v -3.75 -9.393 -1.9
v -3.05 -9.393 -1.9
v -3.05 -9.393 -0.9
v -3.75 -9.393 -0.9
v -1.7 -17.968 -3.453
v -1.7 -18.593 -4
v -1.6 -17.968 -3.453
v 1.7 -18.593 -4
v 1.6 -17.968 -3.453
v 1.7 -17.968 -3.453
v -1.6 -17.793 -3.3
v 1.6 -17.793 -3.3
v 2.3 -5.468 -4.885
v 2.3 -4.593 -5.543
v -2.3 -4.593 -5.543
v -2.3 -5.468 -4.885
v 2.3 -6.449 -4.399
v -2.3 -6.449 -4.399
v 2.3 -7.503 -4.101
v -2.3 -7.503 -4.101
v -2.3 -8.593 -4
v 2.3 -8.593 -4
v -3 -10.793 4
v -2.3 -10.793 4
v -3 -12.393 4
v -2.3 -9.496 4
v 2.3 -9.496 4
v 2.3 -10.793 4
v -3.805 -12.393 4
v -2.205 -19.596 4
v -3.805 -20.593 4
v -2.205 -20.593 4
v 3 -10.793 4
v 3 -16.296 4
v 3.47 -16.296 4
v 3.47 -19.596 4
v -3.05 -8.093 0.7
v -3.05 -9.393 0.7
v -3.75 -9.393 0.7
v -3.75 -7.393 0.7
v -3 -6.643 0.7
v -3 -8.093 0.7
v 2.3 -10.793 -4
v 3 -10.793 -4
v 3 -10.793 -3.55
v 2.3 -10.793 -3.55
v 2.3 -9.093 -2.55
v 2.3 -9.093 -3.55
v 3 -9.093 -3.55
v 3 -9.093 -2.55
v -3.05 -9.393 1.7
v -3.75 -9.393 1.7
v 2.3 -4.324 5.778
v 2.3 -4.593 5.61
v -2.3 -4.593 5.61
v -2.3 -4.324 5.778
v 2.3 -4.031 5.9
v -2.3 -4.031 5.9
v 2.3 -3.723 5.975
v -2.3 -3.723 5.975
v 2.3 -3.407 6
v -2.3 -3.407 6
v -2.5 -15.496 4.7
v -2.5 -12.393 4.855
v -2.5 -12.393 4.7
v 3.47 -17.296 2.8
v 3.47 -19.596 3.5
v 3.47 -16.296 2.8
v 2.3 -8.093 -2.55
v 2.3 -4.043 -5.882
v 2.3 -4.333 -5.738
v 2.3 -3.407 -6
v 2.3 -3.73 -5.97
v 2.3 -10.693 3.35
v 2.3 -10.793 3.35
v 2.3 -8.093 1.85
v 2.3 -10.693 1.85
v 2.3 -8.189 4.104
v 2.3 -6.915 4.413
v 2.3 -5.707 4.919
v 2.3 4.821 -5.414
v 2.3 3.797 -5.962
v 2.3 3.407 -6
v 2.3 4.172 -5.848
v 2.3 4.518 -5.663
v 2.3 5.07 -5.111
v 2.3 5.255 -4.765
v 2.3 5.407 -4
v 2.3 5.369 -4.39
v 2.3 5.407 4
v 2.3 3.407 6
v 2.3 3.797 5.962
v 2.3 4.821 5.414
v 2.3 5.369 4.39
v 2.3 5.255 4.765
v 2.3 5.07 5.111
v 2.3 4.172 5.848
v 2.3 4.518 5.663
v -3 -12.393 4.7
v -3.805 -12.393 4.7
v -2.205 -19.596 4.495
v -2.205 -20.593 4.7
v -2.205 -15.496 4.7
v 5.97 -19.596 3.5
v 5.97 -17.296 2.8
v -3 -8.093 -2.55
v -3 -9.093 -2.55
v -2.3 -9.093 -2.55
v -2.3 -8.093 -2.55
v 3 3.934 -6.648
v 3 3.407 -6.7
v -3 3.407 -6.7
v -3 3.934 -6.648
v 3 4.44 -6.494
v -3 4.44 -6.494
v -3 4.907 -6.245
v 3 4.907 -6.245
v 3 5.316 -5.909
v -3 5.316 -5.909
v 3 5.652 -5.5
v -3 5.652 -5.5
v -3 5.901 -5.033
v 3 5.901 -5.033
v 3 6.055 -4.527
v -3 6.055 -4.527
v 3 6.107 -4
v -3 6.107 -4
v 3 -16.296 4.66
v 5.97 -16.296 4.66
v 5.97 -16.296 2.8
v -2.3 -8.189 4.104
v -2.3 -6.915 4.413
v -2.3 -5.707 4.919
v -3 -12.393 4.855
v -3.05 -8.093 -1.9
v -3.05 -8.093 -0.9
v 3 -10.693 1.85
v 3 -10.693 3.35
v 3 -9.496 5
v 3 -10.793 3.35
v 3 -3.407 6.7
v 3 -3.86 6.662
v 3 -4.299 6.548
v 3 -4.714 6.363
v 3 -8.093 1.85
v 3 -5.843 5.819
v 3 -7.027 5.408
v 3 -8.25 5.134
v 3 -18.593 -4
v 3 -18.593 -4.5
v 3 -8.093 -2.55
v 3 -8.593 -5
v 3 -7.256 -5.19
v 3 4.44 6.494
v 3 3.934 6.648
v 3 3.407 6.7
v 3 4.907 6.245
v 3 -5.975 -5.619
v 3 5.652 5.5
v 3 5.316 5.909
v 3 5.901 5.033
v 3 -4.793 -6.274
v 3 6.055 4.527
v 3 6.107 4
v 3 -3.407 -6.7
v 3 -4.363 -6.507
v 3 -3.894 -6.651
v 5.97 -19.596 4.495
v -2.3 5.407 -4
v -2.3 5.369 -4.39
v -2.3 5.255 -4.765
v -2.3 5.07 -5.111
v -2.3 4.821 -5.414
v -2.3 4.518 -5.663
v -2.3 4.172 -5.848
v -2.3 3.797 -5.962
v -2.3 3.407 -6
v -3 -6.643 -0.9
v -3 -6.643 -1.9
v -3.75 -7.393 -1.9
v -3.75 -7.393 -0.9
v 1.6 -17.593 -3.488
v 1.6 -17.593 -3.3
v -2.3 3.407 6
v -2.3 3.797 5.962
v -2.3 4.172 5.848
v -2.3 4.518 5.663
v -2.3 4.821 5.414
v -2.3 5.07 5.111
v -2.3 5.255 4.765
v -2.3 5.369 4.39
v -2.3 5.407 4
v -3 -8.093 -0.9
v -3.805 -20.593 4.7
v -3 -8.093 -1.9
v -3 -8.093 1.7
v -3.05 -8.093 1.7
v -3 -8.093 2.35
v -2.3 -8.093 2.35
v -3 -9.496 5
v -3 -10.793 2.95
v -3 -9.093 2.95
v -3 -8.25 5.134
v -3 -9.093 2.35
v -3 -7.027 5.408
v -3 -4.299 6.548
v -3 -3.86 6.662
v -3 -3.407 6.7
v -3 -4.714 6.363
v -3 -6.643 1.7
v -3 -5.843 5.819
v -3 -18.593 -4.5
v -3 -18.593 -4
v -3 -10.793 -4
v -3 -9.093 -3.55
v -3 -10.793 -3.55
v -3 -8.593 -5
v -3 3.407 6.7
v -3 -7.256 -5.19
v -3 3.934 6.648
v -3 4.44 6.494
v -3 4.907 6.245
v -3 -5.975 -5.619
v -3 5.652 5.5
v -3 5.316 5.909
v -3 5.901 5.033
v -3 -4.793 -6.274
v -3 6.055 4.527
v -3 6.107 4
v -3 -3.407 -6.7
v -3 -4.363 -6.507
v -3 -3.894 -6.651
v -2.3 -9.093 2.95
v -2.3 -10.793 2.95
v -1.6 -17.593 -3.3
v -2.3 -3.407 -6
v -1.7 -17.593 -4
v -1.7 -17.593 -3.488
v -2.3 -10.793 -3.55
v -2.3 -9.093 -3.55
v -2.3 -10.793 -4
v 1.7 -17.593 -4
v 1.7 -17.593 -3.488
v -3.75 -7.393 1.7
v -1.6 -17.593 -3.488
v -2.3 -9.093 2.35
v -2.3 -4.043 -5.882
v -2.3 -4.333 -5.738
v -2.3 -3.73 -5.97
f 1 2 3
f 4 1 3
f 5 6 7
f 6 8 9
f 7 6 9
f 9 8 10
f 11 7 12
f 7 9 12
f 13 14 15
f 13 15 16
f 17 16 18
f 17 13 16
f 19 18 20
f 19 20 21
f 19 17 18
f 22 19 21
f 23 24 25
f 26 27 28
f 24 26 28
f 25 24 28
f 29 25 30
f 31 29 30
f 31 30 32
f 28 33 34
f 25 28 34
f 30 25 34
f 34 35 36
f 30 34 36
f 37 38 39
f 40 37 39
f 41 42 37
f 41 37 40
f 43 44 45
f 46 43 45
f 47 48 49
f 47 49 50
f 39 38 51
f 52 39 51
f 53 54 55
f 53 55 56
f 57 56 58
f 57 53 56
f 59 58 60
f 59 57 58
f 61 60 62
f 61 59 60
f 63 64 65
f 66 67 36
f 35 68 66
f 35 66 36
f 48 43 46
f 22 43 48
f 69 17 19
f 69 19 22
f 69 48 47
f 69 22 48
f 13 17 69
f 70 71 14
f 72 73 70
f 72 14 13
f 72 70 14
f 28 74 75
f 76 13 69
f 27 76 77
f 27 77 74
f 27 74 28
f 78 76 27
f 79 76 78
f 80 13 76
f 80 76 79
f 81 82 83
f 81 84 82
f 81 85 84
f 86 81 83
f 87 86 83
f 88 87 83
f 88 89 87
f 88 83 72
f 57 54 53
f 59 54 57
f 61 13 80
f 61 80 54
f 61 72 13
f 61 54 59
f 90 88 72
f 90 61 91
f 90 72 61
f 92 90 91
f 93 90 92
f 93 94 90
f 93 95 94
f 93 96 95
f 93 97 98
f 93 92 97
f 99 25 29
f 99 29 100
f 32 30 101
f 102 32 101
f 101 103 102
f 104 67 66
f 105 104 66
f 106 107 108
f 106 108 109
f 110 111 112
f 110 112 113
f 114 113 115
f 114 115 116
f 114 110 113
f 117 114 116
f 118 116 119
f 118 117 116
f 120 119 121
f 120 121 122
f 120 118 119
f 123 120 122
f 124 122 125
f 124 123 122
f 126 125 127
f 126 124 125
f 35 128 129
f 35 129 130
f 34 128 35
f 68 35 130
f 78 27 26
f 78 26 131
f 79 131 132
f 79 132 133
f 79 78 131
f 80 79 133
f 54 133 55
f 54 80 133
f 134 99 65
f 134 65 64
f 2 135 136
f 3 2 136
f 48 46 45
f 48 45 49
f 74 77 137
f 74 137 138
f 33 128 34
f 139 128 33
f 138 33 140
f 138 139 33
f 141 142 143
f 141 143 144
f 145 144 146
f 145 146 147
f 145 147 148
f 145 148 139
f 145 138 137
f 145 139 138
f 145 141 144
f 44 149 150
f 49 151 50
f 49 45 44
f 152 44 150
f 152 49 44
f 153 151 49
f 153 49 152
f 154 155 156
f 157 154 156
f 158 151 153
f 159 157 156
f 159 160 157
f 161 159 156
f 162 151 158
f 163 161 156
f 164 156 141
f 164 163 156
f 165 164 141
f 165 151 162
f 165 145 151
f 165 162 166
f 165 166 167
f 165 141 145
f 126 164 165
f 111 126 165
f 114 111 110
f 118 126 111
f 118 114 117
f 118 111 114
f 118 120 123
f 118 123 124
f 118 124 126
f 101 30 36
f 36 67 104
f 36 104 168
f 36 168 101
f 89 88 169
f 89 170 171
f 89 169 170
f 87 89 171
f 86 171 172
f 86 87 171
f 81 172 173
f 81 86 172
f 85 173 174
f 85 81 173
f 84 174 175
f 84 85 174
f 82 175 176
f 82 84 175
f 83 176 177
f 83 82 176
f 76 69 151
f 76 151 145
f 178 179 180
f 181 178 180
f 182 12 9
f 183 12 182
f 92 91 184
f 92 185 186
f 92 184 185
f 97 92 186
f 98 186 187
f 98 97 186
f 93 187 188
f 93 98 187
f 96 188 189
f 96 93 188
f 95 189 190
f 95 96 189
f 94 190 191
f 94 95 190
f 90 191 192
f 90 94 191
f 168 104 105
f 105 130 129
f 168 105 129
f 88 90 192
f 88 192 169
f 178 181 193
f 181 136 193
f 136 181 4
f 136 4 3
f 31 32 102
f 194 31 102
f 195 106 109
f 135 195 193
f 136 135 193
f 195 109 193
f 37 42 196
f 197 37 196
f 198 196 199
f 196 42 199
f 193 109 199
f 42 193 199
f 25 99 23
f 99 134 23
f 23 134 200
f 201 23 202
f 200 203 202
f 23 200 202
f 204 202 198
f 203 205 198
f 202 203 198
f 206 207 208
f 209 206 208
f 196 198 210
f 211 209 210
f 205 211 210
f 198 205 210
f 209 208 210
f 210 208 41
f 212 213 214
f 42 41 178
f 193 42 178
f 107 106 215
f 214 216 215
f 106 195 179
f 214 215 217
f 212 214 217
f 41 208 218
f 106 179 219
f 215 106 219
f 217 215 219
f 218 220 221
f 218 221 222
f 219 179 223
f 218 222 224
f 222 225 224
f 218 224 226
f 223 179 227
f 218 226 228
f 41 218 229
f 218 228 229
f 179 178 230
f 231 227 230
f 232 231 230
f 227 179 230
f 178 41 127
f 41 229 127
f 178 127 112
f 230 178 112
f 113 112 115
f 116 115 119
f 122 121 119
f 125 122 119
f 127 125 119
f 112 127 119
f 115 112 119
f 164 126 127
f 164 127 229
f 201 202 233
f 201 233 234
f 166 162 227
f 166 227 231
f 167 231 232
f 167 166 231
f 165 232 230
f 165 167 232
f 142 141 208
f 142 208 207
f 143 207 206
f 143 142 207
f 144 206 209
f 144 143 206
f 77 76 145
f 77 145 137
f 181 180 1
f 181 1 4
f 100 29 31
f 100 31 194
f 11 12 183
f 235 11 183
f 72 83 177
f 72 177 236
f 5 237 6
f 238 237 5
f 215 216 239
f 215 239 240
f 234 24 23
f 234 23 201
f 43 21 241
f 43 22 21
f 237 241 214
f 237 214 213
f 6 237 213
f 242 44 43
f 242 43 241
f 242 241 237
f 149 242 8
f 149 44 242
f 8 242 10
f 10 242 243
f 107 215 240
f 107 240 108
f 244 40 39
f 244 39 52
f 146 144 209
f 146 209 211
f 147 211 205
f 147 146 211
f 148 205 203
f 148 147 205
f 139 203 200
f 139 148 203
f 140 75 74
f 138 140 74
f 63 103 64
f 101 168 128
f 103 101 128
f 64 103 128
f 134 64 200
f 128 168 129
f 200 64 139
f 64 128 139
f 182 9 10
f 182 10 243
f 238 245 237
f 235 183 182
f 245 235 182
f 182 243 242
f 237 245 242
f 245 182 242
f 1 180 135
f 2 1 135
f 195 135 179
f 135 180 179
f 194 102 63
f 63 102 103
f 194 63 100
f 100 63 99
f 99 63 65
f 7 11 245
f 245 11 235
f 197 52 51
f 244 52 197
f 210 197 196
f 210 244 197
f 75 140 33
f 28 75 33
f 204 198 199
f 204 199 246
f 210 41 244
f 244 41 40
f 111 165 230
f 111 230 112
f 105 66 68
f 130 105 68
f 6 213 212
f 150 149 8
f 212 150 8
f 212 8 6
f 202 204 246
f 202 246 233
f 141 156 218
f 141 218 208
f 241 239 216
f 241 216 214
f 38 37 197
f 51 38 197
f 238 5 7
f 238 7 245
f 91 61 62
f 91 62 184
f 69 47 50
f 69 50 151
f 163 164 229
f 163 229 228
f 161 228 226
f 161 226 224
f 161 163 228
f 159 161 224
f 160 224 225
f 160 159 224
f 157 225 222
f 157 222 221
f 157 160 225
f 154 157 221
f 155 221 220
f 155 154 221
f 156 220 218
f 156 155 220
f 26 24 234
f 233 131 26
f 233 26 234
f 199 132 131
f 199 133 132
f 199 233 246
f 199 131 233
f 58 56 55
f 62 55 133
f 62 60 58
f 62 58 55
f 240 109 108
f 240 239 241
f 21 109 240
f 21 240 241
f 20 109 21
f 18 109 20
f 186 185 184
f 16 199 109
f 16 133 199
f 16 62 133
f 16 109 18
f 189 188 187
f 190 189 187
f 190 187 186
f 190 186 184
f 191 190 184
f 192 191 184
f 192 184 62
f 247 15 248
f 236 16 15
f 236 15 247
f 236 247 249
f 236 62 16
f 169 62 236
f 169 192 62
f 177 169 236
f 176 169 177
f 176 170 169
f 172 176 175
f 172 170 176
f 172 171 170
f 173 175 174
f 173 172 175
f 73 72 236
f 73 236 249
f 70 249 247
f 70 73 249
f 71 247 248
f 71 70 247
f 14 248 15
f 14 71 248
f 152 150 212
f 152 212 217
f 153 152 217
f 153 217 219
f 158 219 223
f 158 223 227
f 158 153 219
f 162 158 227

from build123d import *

# Parameters (mm, degrees)
BOSS_EXTRUDE1_DEPTH      = 3
BOSS_EXTRUDE2_DEPTH      = 0.7
BOSS_EXTRUDE3_START      = -5.3
BOSS_EXTRUDE3_DEPTH      = 0.7
BOSS_EXTRUDE4_DEPTH      = 1.7
BOSS_EXTRUDE5_DEPTH      = 2.97
BOSS_EXTRUDE6_DEPTH      = 2.5
BOSS_EXTRUDE7_DEPTH      = 0.805
BOSS_EXTRUDE7_DEPTH_BACK = 0.795
SKETCH7_W                = 0.7
SKETCH7_H                = 8.2
CUT_EXTRUDE2_DEPTH       = 0.5
CUT_EXTRUDE3_DEPTH       = 23.844830336
BOSS_EXTRUDE8_DEPTH      = 5.205
INDENT1_START            = -3
INDENT1_DEPTH            = 6
INDENT1_2_DEPTH          = 1.4
INDENT1_START_2          = 1.6
INDENT1_3_OUTLINE_W      = 0.1
INDENT1_3_OUTLINE_H      = 0.4
INDENT1_3_DEPTH          = 1.4
BOSS_EXTRUDE11_START     = 0.05
SKETCH14_W               = 1
SKETCH14_H               = 2
BOSS_EXTRUDE11_DEPTH     = 0.7
BOSS_EXTRUDE11_2_DEPTH   = 0.7
SKETCH15_W               = 1
SKETCH15_H               = 0.7
BOSS_EXTRUDE12_DEPTH     = 0.05
BOSS_EXTRUDE13_REACH     = 25.101
CUT_EXTRUDE4_REACH       = 18.211
SKETCH17_W               = 0.75
SKETCH17_H               = 1.6


# Read off the part's stored shape, not the designer's step: Indent1
with BuildPart() as part:
    # Sketch1 → Boss-Extrude1 (new, symmetric)
    with BuildSketch(Plane(origin=(0, 0, 0), x_dir=(0, 0, -1), z_dir=(1, 0, 0))):
        with BuildLine():
            Line((-4, 5.407024303), (4, 5.407024303))
            ThreePointArc((4, 5.407024303), (5.414213562, 4.821237865), (6, 3.407024303))
            Line((6, 3.407024303), (6, -3.407024303))
            ThreePointArc((6, -3.407024303), (5.881695242, -4.042569102), (5.54262919, -4.592975697))
            ThreePointArc((5.54262919, -4.592975697), (4.399020595, -6.449397799), (4, -8.592975697))
            Line((4, -8.592975697), (4, -18.592975697))
            Line((4, -18.592975697), (4.5, -18.592975697))
            Line((4.5, -18.592975697), (5, -8.592975697))
            ThreePointArc((5, -8.592975697), (5.375406184, -6.605461118), (6.273600288, -4.793172135))
            ThreePointArc((6.273600288, -4.793172135), (6.590990962, -4.132148866), (6.7, -3.407024303))
            Line((6.7, -3.407024303), (6.7, 3.407024303))
            ThreePointArc((6.7, 3.407024303), (5.909188309, 5.316212612), (4, 6.107024303))
            Line((4, 6.107024303), (-4, 6.107024303))
            ThreePointArc((-4, 6.107024303), (-5.909188309, 5.316212612), (-6.7, 3.407024303))
            Line((-6.7, 3.407024303), (-6.7, -3.407024303))
            ThreePointArc((-6.7, -3.407024303), (-6.614300123, -4.08188345), (-6.362640838, -4.7139016))
            ThreePointArc((-6.362640838, -4.7139016), (-5.407997914, -7.026917179), (-5, -9.495706737))
            Line((-5, -9.495706737), (-4.5, -19.495706737))
            Line((-4.5, -19.495706737), (-4, -19.495706737))
            Line((-4, -19.495706737), (-4, -9.495706737))
            ThreePointArc((-4, -9.495706737), (-4.412921237, -6.915479473), (-5.610440713, -4.592975697))
            ThreePointArc((-5.610440713, -4.592975697), (-5.900115974, -4.03117115), (-6, -3.407024303))
            Line((-6, -3.407024303), (-6, 3.407024303))
            ThreePointArc((-6, 3.407024303), (-5.414213562, 4.821237865), (-4, 5.407024303))
        make_face()
    extrude(amount=BOSS_EXTRUDE1_DEPTH, both=True)

    # Sketch2 → Boss-Extrude2 (add)
    with BuildSketch(Plane(origin=(3, 0, 0), x_dir=(0, 0, -1), z_dir=(1, 0, 0))):
        with BuildLine():
            Line((5, -8.592975697), (4.89, -10.792975697))
            Line((4.89, -10.792975697), (-4.935136552, -10.792975697))
            Line((-4.935136552, -10.792975697), (-5, -9.495706737))
            ThreePointArc((-5, -9.495706737), (-5.407997914, -7.026917179), (-6.362640838, -4.7139016))
            ThreePointArc((-6.362640838, -4.7139016), (-6.614300123, -4.08188345), (-6.7, -3.407024303))
            Line((-6.7, -3.407024303), (-6.7, 3.407024303))
            ThreePointArc((-6.7, 3.407024303), (-5.909188309, 5.316212612), (-4, 6.107024303))
            Line((-4, 6.107024303), (4, 6.107024303))
            ThreePointArc((4, 6.107024303), (5.909188309, 5.316212612), (6.7, 3.407024303))
            Line((6.7, 3.407024303), (6.7, -3.407024303))
            ThreePointArc((6.7, -3.407024303), (6.590990962, -4.132148866), (6.273600288, -4.793172135))
            ThreePointArc((6.273600288, -4.793172135), (5.375406184, -6.605461118), (5, -8.592975697))
        make_face()
    extrude(amount=-BOSS_EXTRUDE2_DEPTH)

    # Sketch2<2> → Boss-Extrude3 (add)
    with BuildSketch(Plane(origin=(3, 0, 0), x_dir=(0, 0, -1), z_dir=(1, 0, 0)).offset(BOSS_EXTRUDE3_START)):
        with BuildLine():
            Line((4.89, -10.792975697), (5, -8.592975697))
            ThreePointArc((5, -8.592975697), (5.375406184, -6.605461118), (6.273600288, -4.793172135))
            ThreePointArc((6.273600288, -4.793172135), (6.590990962, -4.132148866), (6.7, -3.407024303))
            Line((6.7, -3.407024303), (6.7, 3.407024303))
            ThreePointArc((6.7, 3.407024303), (5.909188309, 5.316212612), (4, 6.107024303))
            Line((4, 6.107024303), (-4, 6.107024303))
            ThreePointArc((-4, 6.107024303), (-5.909188309, 5.316212612), (-6.7, 3.407024303))
            Line((-6.7, 3.407024303), (-6.7, -3.407024303))
            ThreePointArc((-6.7, -3.407024303), (-6.614300123, -4.08188345), (-6.362640838, -4.7139016))
            ThreePointArc((-6.362640838, -4.7139016), (-5.407997914, -7.026917179), (-5, -9.495706737))
            Line((-5, -9.495706737), (-4.935136552, -10.792975697))
            Line((-4.935136552, -10.792975697), (-4, -10.792975697))
            Line((-4, -10.792975697), (-4, -9.495706737))
            ThreePointArc((-4, -9.495706737), (-4.412921237, -6.915479473), (-5.610440713, -4.592975697))
            ThreePointArc((-5.610440713, -4.592975697), (-5.900115974, -4.03117115), (-6, -3.407024303))
            Line((-6, -3.407024303), (-6, 3.407024303))
            ThreePointArc((-6, 3.407024303), (-5.414213562, 4.821237865), (-4, 5.407024303))
            Line((-4, 5.407024303), (4, 5.407024303))
            ThreePointArc((4, 5.407024303), (5.414213562, 4.821237865), (6, 3.407024303))
            Line((6, 3.407024303), (6, -3.407024303))
            ThreePointArc((6, -3.407024303), (5.881695242, -4.042569102), (5.54262919, -4.592975697))
            ThreePointArc((5.54262919, -4.592975697), (4.399020595, -6.449397799), (4, -8.592975697))
            Line((4, -8.592975697), (4, -10.792975697))
            Line((4, -10.792975697), (4.89, -10.792975697))
        make_face()
        Polygon((4.5, -18.592975697), (4.89, -10.792975697), (4, -10.792975697), (4, -18.592975697), align=None)
        with BuildLine():
            Line((-4, -10.792975697), (4, -10.792975697))
            Line((4, -10.792975697), (4, -8.592975697))
            ThreePointArc((4, -8.592975697), (4.399020595, -6.449397799), (5.54262919, -4.592975697))
            ThreePointArc((5.54262919, -4.592975697), (5.881695242, -4.042569102), (6, -3.407024303))
            Line((6, -3.407024303), (6, 3.407024303))
            ThreePointArc((6, 3.407024303), (5.414213562, 4.821237865), (4, 5.407024303))
            Line((4, 5.407024303), (-4, 5.407024303))
            ThreePointArc((-4, 5.407024303), (-5.414213562, 4.821237865), (-6, 3.407024303))
            Line((-6, 3.407024303), (-6, -3.407024303))
            ThreePointArc((-6, -3.407024303), (-5.900115974, -4.03117115), (-5.610440713, -4.592975697))
            ThreePointArc((-5.610440713, -4.592975697), (-4.412921237, -6.915479473), (-4, -9.495706737))
            Line((-4, -9.495706737), (-4, -10.792975697))
        make_face()
        Polygon((-4, -19.495706737), (-4, -10.792975697), (-4.935136552, -10.792975697), (-4.5, -19.495706737), align=None)
    extrude(amount=-BOSS_EXTRUDE3_DEPTH)

    # Sketch4 → Boss-Extrude4 (add, symmetric)
    with BuildSketch(Plane(origin=(0, 0, 0), x_dir=(0, 0, -1), z_dir=(1, 0, 0))):
        Polygon((3.3, -17.592975697), (4, -17.592975697), (4, -18.592975697), (3.3, -17.792975697), align=None)
    extrude(amount=BOSS_EXTRUDE4_DEPTH, both=True)

    # Sketch5 → Boss-Extrude5 (add)
    with BuildSketch(Plane(origin=(3, 0, 0), x_dir=(0, 0, -1), z_dir=(1, 0, 0))):
        Polygon((-4.495, -19.595706737), (-4.66, -16.295706737), (-4, -16.295706737), (-4, -19.595706737), align=None)
    extrude(amount=BOSS_EXTRUDE5_DEPTH)

    # Sketch6 → Boss-Extrude6 (add)
    with BuildSketch(Plane(origin=(5.97, 0, 0), x_dir=(0, 0, -1), z_dir=(1, 0, 0))):
        Polygon((-4.66, -16.295706737), (-1.51, -16.295706737), (-1.51, -17.795706737), (-3.5, -19.595706737), (-4.495, -19.595706737), align=None)
    extrude(amount=-BOSS_EXTRUDE6_DEPTH)

    # Sketch7 → Boss-Extrude7 (add, two sides: drawn at the far end of the back side and taken through both)
    with BuildSketch(Plane.ZY.offset(3).offset(-BOSS_EXTRUDE7_DEPTH_BACK)):
        with Locations((4.35, -16.492975697)):
            Rectangle(SKETCH7_W, SKETCH7_H)
    extrude(amount=BOSS_EXTRUDE7_DEPTH + BOSS_EXTRUDE7_DEPTH_BACK)

    # Sketch8 → Cut-Extrude2 (cut)
    with BuildSketch(Plane.ZY.offset(3)):
        Polygon((4.7, -15.495706737), (4.7, -12.392975697), (4.855136552, -12.392975697), align=None)
    extrude(amount=-CUT_EXTRUDE2_DEPTH, mode=Mode.SUBTRACT)

    # Sketch9 → Cut-Extrude3 (cut, through all)
    with BuildSketch(Plane.ZY.offset(-3.47)):
        Polygon((2.8, -16.295706737), (1.51, -16.295706737), (1.51, -17.795706737), (3.5, -19.595706737), (2.8, -17.295706737), align=None)
    extrude(amount=-CUT_EXTRUDE3_DEPTH, mode=Mode.SUBTRACT)

    # Sketch10 → Boss-Extrude8 (add)
    with BuildSketch(Plane.ZY.offset(-3)):
        Polygon((4.495, -19.595706737), (4.5, -19.495706737), (4, -19.495706737), (4, -19.595706737), align=None)
    extrude(amount=BOSS_EXTRUDE8_DEPTH)

    # Indent1 outline → Indent1 (cut)
    with BuildSketch(Plane.YZ.offset(INDENT1_START)):
        Polygon((-8.092975697, -2.55), (-8.092975697, 1.85), (-10.692975697, 1.85), (-10.692975697, 2.95), (-10.792975697, 2.95), (-10.792975697, -3.55), (-9.092975697, -3.55), (-9.092975697, -2.55), align=None)
    extrude(amount=INDENT1_DEPTH, mode=Mode.SUBTRACT)

    # Indent1 2 outline → Indent1 2 (cut)
    with BuildSketch(Plane.YZ.offset(INDENT1_START)):
        Polygon((-17.792975697, -3.3), (-17.968374126, -3.453473625), (-17.592975697, -3.487600755), (-17.592975697, -3.3), align=None)
        Polygon((-8.092975697, 2.35), (-9.092975697, 2.35), (-9.092975697, 2.95), (-10.692975697, 2.95), (-10.692975697, 1.85), (-8.092975697, 1.85), align=None)
    extrude(amount=INDENT1_2_DEPTH, mode=Mode.SUBTRACT)

    # Indent1 3 outline → Indent1 3 (cut)
    with BuildSketch(Plane.YZ.offset(INDENT1_START_2)):
        Polygon((-17.792975697, -3.3), (-17.968374126, -3.453473625), (-17.592975697, -3.487600755), (-17.592975697, -3.3), align=None)
        with Locations((-10.742975697, 3.15)):
            Rectangle(INDENT1_3_OUTLINE_W, INDENT1_3_OUTLINE_H)
    extrude(amount=INDENT1_3_DEPTH, mode=Mode.SUBTRACT)



with BuildPart() as body_2:
    # Sketch14 → Boss-Extrude11 (new body)
    with BuildSketch(Plane.ZY.offset(3).offset(BOSS_EXTRUDE11_START)):
        with Locations((1.2, -8.392975697)):
            Rectangle(SKETCH14_W, SKETCH14_H)
    extrude(amount=BOSS_EXTRUDE11_DEPTH)


with BuildPart() as body_3:
    # Sketch14 → Boss-Extrude11 2 (new body)
    with BuildSketch(Plane.ZY.offset(3).offset(BOSS_EXTRUDE11_START)):
        with Locations((-1.4, -8.392975697)):
            Rectangle(SKETCH14_W, SKETCH14_H)
    extrude(amount=BOSS_EXTRUDE11_2_DEPTH)


with BuildPart() as part_1:
    add(part.part)

    add(body_2.part)  # Boss-Extrude12 merges body 2

    add(body_3.part)  # Boss-Extrude12 merges body 3
    # Sketch15 → Boss-Extrude12 (add)
    with BuildSketch(Plane.ZY.offset(3)):
        with Locations((1.2, -7.742975697)):
            Rectangle(SKETCH15_W, SKETCH15_H)
        with Locations((-1.4, -7.742975697)):
            Rectangle(SKETCH15_W, SKETCH15_H)
    extrude(amount=BOSS_EXTRUDE12_DEPTH)

    # Boss-Extrude13: up to this face of the body (flat: up to its plane)
    boss_extrude13_end = Plane(part_1.part.faces().sort_by_distance((-3.390853659, -8.377122039, 1.7))[0])
    # Sketch16 → Boss-Extrude13 (add, up to the picked face)
    with BuildSketch(Plane(origin=(0, 0, -1.9), x_dir=(-1, 0, 0), z_dir=(0, 0, -1)), mode=Mode.PRIVATE) as boss_extrude13_sk1:
        Polygon((3, -7.392975697), (3, -6.642975697), (3.75, -7.392975697), align=None)
    boss_extrude13_tool1 = split(extrude(boss_extrude13_sk1.sketch, amount=-BOSS_EXTRUDE13_REACH, mode=Mode.PRIVATE), bisect_by=boss_extrude13_end, keep=Keep.BOTH, mode=Mode.PRIVATE)
    add(boss_extrude13_tool1.solids().sort_by(Axis((-3.25, -7.142976, -1.9), (0, 0, 1)))[0])

    # Cut-Extrude4: up to this face of the body (flat: up to its plane)
    cut_extrude4_end = Plane(part_1.part.faces().sort_by_distance((-3.375, -7.017975697, -0.1))[0])
    # Sketch17 → Cut-Extrude4 (cut, up to the picked face)
    with BuildSketch(Plane.XZ.offset(7.392975697), mode=Mode.PRIVATE) as cut_extrude4_sk1:
        with Locations((-3.375, -0.1)):
            Rectangle(SKETCH17_W, SKETCH17_H)
    cut_extrude4_tool1 = split(extrude(cut_extrude4_sk1.sketch, amount=-CUT_EXTRUDE4_REACH, mode=Mode.PRIVATE), bisect_by=cut_extrude4_end, keep=Keep.BOTH, mode=Mode.PRIVATE)
    add(cut_extrude4_tool1.solids().sort_by(Axis((-3.375, -7.392976, -0.1), (0, 1, 0)))[0], mode=Mode.SUBTRACT)


solid = part_1.part
